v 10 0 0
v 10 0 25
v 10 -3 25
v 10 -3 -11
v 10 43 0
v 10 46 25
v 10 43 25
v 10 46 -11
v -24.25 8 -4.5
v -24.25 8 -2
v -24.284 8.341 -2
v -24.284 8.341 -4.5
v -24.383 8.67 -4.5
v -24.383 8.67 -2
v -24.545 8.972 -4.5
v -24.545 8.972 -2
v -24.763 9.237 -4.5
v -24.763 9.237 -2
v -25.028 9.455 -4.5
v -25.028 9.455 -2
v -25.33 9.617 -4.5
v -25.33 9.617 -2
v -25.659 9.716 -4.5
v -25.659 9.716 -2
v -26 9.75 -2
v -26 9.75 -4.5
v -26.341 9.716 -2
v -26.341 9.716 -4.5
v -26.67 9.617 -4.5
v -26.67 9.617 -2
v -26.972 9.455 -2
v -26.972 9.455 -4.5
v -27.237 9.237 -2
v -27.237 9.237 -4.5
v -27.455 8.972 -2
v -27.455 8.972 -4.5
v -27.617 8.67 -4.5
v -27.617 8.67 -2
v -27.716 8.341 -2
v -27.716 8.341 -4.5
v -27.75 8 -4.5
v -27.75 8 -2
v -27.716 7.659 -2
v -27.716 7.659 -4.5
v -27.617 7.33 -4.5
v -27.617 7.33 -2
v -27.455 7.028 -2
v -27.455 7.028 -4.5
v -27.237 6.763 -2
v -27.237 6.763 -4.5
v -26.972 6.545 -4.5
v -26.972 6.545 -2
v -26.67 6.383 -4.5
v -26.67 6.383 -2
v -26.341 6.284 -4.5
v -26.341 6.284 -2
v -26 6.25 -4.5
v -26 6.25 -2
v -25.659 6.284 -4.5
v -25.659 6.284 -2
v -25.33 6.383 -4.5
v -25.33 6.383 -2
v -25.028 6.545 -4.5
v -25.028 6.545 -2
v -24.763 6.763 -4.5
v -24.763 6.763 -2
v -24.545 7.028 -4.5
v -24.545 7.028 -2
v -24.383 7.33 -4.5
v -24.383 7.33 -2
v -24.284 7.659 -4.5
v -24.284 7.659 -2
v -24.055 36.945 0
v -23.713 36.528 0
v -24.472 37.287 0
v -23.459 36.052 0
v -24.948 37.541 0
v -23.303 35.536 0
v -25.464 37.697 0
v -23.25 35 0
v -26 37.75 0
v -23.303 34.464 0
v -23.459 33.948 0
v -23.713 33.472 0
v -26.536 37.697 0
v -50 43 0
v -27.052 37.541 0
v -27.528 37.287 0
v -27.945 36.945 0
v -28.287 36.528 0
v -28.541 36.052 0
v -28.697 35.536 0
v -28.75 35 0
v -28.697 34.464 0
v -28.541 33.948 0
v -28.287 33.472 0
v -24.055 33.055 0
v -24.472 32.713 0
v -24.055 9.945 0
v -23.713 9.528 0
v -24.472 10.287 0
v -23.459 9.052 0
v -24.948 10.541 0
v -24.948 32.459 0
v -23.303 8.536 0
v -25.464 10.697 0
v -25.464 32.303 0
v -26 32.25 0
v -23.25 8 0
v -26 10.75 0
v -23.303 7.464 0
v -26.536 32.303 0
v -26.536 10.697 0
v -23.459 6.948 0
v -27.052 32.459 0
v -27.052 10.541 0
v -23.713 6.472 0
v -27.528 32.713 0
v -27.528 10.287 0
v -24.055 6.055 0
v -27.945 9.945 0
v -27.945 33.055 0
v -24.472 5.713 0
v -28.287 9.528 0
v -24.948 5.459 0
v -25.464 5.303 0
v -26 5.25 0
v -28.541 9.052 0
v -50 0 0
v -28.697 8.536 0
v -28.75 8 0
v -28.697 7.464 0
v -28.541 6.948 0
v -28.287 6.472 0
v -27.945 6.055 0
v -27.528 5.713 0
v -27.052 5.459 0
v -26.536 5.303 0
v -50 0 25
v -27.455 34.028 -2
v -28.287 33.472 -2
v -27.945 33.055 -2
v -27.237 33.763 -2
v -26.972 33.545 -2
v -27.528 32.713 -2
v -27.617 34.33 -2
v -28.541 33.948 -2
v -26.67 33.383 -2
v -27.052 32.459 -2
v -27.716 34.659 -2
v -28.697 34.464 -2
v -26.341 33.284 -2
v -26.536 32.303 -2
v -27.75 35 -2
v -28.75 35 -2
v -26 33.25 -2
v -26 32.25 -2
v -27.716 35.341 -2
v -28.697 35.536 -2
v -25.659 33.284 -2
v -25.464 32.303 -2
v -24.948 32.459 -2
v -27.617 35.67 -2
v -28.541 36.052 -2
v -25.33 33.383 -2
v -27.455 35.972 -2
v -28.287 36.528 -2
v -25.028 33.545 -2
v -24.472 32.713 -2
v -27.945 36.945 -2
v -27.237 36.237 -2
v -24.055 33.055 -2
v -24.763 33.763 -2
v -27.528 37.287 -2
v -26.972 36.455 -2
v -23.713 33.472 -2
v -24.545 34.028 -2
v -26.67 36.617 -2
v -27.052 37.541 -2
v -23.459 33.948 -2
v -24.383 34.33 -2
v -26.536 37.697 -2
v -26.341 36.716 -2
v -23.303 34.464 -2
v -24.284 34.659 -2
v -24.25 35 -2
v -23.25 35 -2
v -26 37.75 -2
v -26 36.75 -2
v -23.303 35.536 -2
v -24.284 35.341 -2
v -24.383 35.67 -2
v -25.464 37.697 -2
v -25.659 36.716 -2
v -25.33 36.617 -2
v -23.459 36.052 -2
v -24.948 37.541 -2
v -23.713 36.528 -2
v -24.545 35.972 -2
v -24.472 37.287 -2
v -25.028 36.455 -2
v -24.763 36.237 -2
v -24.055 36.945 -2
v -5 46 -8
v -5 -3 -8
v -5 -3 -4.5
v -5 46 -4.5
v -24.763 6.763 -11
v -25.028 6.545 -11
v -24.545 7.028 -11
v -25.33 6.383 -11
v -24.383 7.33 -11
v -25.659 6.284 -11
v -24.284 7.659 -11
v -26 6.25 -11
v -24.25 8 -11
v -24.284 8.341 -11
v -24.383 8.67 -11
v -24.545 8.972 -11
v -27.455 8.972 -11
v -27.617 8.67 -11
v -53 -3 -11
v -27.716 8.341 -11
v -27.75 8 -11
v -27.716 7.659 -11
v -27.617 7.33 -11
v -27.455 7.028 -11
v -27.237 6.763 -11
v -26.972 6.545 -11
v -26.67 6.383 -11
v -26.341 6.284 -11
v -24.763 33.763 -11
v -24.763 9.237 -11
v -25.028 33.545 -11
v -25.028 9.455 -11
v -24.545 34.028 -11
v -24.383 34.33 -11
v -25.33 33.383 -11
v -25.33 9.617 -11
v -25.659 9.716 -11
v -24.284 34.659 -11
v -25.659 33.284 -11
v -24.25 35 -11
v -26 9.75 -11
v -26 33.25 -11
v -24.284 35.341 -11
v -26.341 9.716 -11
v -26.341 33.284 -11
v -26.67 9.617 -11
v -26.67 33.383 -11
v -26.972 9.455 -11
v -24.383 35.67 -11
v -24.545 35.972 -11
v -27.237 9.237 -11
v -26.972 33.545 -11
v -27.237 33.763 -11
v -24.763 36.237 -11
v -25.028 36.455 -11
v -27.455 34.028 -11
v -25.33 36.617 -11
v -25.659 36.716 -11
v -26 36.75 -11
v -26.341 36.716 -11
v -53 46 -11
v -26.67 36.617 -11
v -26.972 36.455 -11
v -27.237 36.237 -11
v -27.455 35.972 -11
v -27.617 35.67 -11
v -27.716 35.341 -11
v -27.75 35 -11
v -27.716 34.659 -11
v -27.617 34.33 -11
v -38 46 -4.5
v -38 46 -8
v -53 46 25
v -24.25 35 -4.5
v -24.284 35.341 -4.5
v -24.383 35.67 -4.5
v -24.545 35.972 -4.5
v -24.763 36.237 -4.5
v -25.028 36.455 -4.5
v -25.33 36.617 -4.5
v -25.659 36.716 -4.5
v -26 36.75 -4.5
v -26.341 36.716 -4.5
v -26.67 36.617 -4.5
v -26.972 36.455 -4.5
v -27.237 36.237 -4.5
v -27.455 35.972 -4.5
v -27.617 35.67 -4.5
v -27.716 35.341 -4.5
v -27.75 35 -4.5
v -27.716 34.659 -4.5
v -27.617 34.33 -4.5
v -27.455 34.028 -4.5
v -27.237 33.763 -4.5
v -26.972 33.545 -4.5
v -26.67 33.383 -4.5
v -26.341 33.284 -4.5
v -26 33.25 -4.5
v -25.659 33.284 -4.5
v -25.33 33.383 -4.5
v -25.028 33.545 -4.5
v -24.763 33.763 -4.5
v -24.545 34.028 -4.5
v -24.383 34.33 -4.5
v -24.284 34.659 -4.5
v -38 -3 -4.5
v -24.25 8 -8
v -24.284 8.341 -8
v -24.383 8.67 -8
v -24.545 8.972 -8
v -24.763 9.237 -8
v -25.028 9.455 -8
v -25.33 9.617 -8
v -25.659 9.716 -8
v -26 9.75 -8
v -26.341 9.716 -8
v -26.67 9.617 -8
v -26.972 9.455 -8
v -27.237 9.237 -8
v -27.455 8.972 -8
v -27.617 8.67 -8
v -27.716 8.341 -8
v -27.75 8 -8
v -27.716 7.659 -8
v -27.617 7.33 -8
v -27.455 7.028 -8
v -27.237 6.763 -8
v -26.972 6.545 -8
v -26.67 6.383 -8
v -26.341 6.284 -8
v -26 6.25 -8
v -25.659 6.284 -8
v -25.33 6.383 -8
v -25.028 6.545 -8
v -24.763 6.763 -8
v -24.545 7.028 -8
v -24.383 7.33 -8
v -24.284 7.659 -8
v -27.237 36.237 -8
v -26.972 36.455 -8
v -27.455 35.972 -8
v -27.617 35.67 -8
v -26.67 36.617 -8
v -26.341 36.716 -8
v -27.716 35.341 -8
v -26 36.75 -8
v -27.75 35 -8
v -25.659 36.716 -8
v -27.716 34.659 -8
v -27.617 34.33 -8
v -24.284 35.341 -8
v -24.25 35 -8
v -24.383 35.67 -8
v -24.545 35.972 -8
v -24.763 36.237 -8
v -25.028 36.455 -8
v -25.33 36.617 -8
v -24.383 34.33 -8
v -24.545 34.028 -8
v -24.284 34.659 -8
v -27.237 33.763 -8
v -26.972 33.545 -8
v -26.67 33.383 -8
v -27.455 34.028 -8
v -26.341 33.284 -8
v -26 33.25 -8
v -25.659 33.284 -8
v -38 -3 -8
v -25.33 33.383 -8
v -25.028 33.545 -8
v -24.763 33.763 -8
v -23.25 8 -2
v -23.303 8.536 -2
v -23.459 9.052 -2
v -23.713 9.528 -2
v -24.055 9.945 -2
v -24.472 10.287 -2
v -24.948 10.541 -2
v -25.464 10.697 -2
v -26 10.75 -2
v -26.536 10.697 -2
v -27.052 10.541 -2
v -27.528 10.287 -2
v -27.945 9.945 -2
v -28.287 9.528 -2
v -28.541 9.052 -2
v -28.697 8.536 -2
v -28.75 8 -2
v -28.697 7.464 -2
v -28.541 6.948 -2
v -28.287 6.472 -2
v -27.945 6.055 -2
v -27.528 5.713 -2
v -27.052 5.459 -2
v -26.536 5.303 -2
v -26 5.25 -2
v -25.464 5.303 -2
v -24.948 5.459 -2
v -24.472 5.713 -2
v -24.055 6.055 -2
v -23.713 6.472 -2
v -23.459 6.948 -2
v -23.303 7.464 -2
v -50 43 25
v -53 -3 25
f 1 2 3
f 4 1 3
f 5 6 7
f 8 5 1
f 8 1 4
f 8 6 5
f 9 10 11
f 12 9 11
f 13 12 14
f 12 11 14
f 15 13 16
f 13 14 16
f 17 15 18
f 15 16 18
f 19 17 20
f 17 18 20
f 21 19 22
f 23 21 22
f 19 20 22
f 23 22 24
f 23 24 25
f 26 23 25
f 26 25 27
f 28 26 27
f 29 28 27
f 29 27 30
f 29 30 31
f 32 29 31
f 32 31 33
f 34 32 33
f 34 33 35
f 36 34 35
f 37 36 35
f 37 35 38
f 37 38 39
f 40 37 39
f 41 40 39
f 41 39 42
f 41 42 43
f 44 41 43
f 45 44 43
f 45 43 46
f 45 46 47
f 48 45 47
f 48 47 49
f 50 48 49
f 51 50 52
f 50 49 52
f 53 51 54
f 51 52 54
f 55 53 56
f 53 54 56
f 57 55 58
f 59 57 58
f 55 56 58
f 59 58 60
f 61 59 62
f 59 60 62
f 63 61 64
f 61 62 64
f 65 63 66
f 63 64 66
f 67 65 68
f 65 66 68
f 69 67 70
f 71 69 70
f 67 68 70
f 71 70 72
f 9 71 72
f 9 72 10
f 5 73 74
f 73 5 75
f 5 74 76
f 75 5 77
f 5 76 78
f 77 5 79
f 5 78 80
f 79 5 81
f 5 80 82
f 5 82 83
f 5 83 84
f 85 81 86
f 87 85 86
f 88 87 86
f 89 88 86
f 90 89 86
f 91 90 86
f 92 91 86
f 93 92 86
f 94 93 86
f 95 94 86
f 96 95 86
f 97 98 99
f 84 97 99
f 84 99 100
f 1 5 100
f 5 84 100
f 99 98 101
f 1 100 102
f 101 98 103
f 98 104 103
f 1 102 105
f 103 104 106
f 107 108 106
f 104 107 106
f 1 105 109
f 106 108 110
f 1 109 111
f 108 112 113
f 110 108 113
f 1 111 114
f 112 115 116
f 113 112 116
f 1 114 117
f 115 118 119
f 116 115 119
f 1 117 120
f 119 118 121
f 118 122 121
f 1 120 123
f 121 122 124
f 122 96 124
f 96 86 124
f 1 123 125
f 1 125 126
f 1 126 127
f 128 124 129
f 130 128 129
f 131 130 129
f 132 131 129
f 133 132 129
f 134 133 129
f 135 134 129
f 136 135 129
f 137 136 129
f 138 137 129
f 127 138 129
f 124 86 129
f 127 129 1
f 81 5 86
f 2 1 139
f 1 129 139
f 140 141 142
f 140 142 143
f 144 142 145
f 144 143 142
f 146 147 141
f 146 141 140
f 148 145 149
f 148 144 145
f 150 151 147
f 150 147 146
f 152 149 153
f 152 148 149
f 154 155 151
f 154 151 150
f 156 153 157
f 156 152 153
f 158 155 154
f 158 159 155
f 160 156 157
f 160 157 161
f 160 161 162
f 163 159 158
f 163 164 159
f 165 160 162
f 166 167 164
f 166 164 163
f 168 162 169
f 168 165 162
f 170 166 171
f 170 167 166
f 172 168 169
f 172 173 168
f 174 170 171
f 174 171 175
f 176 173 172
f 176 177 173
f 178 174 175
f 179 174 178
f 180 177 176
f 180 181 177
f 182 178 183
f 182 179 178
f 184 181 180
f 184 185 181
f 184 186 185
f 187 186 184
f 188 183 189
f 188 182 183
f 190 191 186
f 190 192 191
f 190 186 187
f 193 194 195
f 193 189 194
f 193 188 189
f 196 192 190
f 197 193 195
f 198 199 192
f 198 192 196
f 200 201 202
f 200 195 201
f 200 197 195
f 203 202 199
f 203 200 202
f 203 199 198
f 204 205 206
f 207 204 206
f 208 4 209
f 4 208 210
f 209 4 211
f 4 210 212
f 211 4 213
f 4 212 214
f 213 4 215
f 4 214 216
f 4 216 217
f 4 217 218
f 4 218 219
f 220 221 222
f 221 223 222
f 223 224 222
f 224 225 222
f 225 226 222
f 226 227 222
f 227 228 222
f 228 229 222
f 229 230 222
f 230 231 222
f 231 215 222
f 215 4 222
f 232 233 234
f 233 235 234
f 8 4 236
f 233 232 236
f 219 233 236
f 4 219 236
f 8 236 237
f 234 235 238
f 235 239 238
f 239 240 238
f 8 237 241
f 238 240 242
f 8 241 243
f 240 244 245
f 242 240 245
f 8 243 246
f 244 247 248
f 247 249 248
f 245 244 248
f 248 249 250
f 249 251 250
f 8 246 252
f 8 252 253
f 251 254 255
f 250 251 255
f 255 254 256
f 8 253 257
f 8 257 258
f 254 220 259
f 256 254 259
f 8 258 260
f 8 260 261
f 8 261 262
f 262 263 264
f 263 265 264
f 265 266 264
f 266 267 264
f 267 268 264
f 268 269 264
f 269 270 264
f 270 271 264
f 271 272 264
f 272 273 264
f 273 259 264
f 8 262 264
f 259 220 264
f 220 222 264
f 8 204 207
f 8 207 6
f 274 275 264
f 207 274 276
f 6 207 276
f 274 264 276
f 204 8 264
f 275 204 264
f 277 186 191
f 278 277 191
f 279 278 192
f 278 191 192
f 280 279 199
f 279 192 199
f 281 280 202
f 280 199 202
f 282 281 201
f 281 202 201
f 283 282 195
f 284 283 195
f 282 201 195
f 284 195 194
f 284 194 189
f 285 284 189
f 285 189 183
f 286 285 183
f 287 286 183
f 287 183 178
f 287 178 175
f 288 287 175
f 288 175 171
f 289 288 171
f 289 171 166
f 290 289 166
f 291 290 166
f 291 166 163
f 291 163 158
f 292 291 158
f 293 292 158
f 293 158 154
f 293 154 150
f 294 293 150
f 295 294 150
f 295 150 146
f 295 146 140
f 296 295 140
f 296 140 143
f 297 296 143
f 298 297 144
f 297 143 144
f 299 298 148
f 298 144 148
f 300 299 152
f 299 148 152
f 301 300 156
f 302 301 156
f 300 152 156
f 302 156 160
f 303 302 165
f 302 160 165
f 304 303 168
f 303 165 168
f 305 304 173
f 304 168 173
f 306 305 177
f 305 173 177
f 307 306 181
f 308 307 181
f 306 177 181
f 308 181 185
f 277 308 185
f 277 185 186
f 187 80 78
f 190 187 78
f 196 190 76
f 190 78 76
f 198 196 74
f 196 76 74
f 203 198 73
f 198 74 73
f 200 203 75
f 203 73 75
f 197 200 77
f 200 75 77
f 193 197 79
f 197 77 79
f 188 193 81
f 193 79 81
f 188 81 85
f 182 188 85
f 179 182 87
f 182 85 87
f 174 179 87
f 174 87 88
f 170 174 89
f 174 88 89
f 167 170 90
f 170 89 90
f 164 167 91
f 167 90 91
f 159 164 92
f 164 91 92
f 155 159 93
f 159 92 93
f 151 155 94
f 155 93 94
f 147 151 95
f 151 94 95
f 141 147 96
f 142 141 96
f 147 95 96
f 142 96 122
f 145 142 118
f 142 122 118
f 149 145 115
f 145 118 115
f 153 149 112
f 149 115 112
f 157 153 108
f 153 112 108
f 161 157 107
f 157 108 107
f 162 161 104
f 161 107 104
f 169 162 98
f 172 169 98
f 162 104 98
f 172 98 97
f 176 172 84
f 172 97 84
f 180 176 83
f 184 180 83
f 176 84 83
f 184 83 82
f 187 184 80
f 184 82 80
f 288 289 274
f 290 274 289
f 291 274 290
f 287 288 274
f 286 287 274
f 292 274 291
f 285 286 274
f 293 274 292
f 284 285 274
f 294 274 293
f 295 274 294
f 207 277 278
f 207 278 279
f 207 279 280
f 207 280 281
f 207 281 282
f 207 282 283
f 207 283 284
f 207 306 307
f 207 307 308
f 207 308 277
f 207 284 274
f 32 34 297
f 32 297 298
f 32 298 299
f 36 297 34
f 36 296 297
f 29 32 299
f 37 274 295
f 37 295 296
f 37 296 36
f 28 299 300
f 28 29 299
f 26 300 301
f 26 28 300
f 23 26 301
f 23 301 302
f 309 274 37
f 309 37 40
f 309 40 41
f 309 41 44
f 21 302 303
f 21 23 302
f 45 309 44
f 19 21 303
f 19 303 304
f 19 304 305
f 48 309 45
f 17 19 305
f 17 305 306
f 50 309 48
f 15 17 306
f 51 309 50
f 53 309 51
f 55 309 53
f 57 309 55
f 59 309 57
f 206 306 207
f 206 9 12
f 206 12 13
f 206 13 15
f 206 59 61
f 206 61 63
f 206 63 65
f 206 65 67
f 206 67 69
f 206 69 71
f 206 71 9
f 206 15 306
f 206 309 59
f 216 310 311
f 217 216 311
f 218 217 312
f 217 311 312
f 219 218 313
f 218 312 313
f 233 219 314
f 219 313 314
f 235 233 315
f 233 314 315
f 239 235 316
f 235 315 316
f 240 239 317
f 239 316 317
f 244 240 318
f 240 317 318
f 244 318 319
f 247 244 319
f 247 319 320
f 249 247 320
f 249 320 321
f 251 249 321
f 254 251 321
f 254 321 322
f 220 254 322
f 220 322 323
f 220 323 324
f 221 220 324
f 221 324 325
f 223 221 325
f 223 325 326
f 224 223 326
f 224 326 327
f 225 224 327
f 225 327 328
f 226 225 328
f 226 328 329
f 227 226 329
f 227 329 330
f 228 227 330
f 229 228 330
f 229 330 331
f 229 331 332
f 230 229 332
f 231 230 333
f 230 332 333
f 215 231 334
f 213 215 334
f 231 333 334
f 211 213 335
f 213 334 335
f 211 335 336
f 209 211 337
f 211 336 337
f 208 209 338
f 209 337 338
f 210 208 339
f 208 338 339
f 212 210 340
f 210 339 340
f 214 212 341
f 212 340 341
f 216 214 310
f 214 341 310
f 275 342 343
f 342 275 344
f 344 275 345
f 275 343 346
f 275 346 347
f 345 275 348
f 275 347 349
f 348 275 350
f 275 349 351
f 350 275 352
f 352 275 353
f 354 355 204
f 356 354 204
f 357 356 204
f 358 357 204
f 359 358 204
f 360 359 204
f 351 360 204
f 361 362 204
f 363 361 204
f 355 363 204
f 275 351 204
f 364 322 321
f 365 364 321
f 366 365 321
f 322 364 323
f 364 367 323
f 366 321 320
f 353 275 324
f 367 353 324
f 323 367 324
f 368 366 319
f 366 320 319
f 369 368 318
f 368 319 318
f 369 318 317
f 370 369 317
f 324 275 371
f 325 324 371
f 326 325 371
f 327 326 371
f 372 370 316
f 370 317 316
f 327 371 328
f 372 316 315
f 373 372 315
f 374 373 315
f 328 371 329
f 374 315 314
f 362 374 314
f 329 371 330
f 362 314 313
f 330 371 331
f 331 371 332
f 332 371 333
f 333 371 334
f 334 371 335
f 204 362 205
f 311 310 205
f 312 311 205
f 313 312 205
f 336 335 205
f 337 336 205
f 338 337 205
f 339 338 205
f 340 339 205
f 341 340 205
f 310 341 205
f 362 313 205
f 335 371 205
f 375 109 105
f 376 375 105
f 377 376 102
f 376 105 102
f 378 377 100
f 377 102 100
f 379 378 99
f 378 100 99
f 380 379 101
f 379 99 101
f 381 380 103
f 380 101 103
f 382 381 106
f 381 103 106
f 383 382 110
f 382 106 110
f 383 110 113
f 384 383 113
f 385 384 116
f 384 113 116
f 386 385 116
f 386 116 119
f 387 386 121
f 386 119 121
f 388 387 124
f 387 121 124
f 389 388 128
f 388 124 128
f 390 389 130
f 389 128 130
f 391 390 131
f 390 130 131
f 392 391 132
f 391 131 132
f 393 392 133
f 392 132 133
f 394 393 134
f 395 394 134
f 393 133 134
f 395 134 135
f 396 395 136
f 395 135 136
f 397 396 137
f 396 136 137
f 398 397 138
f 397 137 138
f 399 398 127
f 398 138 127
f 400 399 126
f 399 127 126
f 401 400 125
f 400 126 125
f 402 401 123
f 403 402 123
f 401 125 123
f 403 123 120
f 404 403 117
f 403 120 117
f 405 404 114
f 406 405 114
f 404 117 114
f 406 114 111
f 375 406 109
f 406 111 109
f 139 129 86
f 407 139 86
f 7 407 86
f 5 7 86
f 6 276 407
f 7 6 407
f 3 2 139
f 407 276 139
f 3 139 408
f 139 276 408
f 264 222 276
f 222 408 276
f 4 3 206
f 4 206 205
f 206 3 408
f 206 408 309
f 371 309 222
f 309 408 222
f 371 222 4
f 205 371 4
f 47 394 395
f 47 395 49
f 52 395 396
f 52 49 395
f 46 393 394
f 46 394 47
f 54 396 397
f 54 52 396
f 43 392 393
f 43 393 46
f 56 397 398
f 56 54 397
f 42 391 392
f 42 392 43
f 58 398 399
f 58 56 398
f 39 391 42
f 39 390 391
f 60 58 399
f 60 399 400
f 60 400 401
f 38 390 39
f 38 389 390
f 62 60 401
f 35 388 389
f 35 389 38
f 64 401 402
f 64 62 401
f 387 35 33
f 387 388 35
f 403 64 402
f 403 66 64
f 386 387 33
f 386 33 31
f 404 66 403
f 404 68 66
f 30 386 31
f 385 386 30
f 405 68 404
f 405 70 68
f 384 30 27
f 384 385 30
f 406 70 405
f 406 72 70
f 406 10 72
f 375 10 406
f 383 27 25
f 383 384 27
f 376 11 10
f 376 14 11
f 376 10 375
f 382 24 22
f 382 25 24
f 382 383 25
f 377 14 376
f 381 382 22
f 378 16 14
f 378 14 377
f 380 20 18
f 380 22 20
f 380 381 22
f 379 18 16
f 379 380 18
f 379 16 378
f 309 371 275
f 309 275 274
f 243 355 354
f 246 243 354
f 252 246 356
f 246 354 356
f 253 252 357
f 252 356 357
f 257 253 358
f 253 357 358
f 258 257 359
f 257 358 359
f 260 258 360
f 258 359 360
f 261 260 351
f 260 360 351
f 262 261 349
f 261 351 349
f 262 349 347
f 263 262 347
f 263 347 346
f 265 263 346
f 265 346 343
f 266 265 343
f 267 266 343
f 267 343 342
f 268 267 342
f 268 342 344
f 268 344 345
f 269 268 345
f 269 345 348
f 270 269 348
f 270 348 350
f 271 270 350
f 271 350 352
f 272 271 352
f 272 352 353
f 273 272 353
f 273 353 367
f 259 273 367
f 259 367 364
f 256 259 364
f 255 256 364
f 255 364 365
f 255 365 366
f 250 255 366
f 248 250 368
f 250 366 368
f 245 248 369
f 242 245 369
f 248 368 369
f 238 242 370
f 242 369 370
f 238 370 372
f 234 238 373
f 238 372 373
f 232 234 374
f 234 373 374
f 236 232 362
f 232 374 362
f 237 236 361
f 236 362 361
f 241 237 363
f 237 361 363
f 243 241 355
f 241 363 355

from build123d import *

# Parameters (mm, degrees)
EXTRUDE_1_DEPTH     = 25
SKETCH_2_W          = 53
SKETCH_2_H          = 49
EXTRUDE_2_DEPTH     = 11
SKETCH_4_R          = 2.75
CUT_EXTRUDE_1_DEPTH = 2
SKETCH_5_R          = 1.75
CUT_EXTRUDE_2_DEPTH = 76.193084788
SKETCH_8_W          = 33
SKETCH_8_H          = 3.5
CUT_EXTRUDE_3_DEPTH = 77.387171698
EXTRUDE_3_DEPTH     = 10


with BuildPart() as part:
    # 草图1 → 凸台-拉伸1 (new body)
    with BuildSketch(Plane.XY):
        Polygon((0, 43), (0, 46), (-53, 46), (-53, -3), (0, -3), (0, 0), (-50, 0), (-50, 43), align=None)
    extrude(amount=EXTRUDE_1_DEPTH)

    # 草图2 → 凸台-拉伸2 (add)
    with BuildSketch(Plane(origin=(0, 0, 0), x_dir=(-1, 0, 0), z_dir=(0, 0, -1))):
        with Locations((26.5, 21.5)):
            Rectangle(SKETCH_2_W, SKETCH_2_H)
    extrude(amount=EXTRUDE_2_DEPTH)

    # 草图4 → 切除-拉伸1 (cut)
    with BuildSketch(Plane.XY):
        with Locations((-26, 35)):
            Circle(SKETCH_4_R)
        with Locations((-26, 8)):
            Circle(SKETCH_4_R)
    extrude(amount=-CUT_EXTRUDE_1_DEPTH, mode=Mode.SUBTRACT)

    # 草图5 → 切除-拉伸2 (cut, through all)
    with BuildSketch(Plane.XY.offset(-2)):
        with Locations((-26, 8)):
            Circle(SKETCH_5_R)
        with Locations((-26, 35)):
            Circle(SKETCH_5_R)
    extrude(amount=-CUT_EXTRUDE_2_DEPTH, mode=Mode.SUBTRACT)

    # 草图8 → 切除-拉伸3 (cut, through all)
    with BuildSketch(Plane.XZ.offset(3)):
        with Locations((-21.5, -6.25)):
            Rectangle(SKETCH_8_W, SKETCH_8_H)
    extrude(amount=-CUT_EXTRUDE_3_DEPTH, mode=Mode.SUBTRACT)

    # 草图9 → 凸台-拉伸3 (add)
    with BuildSketch(Plane(origin=(0, 0, 0), x_dir=(0, 0, -1), z_dir=(1, 0, 0))):
        Polygon((-25, 43), (0, 43), (0, 0), (-25, 0), (-25, -3), (11, -3), (11, 46), (-25, 46), align=None)
    extrude(amount=EXTRUDE_3_DEPTH)


solid = part.part
